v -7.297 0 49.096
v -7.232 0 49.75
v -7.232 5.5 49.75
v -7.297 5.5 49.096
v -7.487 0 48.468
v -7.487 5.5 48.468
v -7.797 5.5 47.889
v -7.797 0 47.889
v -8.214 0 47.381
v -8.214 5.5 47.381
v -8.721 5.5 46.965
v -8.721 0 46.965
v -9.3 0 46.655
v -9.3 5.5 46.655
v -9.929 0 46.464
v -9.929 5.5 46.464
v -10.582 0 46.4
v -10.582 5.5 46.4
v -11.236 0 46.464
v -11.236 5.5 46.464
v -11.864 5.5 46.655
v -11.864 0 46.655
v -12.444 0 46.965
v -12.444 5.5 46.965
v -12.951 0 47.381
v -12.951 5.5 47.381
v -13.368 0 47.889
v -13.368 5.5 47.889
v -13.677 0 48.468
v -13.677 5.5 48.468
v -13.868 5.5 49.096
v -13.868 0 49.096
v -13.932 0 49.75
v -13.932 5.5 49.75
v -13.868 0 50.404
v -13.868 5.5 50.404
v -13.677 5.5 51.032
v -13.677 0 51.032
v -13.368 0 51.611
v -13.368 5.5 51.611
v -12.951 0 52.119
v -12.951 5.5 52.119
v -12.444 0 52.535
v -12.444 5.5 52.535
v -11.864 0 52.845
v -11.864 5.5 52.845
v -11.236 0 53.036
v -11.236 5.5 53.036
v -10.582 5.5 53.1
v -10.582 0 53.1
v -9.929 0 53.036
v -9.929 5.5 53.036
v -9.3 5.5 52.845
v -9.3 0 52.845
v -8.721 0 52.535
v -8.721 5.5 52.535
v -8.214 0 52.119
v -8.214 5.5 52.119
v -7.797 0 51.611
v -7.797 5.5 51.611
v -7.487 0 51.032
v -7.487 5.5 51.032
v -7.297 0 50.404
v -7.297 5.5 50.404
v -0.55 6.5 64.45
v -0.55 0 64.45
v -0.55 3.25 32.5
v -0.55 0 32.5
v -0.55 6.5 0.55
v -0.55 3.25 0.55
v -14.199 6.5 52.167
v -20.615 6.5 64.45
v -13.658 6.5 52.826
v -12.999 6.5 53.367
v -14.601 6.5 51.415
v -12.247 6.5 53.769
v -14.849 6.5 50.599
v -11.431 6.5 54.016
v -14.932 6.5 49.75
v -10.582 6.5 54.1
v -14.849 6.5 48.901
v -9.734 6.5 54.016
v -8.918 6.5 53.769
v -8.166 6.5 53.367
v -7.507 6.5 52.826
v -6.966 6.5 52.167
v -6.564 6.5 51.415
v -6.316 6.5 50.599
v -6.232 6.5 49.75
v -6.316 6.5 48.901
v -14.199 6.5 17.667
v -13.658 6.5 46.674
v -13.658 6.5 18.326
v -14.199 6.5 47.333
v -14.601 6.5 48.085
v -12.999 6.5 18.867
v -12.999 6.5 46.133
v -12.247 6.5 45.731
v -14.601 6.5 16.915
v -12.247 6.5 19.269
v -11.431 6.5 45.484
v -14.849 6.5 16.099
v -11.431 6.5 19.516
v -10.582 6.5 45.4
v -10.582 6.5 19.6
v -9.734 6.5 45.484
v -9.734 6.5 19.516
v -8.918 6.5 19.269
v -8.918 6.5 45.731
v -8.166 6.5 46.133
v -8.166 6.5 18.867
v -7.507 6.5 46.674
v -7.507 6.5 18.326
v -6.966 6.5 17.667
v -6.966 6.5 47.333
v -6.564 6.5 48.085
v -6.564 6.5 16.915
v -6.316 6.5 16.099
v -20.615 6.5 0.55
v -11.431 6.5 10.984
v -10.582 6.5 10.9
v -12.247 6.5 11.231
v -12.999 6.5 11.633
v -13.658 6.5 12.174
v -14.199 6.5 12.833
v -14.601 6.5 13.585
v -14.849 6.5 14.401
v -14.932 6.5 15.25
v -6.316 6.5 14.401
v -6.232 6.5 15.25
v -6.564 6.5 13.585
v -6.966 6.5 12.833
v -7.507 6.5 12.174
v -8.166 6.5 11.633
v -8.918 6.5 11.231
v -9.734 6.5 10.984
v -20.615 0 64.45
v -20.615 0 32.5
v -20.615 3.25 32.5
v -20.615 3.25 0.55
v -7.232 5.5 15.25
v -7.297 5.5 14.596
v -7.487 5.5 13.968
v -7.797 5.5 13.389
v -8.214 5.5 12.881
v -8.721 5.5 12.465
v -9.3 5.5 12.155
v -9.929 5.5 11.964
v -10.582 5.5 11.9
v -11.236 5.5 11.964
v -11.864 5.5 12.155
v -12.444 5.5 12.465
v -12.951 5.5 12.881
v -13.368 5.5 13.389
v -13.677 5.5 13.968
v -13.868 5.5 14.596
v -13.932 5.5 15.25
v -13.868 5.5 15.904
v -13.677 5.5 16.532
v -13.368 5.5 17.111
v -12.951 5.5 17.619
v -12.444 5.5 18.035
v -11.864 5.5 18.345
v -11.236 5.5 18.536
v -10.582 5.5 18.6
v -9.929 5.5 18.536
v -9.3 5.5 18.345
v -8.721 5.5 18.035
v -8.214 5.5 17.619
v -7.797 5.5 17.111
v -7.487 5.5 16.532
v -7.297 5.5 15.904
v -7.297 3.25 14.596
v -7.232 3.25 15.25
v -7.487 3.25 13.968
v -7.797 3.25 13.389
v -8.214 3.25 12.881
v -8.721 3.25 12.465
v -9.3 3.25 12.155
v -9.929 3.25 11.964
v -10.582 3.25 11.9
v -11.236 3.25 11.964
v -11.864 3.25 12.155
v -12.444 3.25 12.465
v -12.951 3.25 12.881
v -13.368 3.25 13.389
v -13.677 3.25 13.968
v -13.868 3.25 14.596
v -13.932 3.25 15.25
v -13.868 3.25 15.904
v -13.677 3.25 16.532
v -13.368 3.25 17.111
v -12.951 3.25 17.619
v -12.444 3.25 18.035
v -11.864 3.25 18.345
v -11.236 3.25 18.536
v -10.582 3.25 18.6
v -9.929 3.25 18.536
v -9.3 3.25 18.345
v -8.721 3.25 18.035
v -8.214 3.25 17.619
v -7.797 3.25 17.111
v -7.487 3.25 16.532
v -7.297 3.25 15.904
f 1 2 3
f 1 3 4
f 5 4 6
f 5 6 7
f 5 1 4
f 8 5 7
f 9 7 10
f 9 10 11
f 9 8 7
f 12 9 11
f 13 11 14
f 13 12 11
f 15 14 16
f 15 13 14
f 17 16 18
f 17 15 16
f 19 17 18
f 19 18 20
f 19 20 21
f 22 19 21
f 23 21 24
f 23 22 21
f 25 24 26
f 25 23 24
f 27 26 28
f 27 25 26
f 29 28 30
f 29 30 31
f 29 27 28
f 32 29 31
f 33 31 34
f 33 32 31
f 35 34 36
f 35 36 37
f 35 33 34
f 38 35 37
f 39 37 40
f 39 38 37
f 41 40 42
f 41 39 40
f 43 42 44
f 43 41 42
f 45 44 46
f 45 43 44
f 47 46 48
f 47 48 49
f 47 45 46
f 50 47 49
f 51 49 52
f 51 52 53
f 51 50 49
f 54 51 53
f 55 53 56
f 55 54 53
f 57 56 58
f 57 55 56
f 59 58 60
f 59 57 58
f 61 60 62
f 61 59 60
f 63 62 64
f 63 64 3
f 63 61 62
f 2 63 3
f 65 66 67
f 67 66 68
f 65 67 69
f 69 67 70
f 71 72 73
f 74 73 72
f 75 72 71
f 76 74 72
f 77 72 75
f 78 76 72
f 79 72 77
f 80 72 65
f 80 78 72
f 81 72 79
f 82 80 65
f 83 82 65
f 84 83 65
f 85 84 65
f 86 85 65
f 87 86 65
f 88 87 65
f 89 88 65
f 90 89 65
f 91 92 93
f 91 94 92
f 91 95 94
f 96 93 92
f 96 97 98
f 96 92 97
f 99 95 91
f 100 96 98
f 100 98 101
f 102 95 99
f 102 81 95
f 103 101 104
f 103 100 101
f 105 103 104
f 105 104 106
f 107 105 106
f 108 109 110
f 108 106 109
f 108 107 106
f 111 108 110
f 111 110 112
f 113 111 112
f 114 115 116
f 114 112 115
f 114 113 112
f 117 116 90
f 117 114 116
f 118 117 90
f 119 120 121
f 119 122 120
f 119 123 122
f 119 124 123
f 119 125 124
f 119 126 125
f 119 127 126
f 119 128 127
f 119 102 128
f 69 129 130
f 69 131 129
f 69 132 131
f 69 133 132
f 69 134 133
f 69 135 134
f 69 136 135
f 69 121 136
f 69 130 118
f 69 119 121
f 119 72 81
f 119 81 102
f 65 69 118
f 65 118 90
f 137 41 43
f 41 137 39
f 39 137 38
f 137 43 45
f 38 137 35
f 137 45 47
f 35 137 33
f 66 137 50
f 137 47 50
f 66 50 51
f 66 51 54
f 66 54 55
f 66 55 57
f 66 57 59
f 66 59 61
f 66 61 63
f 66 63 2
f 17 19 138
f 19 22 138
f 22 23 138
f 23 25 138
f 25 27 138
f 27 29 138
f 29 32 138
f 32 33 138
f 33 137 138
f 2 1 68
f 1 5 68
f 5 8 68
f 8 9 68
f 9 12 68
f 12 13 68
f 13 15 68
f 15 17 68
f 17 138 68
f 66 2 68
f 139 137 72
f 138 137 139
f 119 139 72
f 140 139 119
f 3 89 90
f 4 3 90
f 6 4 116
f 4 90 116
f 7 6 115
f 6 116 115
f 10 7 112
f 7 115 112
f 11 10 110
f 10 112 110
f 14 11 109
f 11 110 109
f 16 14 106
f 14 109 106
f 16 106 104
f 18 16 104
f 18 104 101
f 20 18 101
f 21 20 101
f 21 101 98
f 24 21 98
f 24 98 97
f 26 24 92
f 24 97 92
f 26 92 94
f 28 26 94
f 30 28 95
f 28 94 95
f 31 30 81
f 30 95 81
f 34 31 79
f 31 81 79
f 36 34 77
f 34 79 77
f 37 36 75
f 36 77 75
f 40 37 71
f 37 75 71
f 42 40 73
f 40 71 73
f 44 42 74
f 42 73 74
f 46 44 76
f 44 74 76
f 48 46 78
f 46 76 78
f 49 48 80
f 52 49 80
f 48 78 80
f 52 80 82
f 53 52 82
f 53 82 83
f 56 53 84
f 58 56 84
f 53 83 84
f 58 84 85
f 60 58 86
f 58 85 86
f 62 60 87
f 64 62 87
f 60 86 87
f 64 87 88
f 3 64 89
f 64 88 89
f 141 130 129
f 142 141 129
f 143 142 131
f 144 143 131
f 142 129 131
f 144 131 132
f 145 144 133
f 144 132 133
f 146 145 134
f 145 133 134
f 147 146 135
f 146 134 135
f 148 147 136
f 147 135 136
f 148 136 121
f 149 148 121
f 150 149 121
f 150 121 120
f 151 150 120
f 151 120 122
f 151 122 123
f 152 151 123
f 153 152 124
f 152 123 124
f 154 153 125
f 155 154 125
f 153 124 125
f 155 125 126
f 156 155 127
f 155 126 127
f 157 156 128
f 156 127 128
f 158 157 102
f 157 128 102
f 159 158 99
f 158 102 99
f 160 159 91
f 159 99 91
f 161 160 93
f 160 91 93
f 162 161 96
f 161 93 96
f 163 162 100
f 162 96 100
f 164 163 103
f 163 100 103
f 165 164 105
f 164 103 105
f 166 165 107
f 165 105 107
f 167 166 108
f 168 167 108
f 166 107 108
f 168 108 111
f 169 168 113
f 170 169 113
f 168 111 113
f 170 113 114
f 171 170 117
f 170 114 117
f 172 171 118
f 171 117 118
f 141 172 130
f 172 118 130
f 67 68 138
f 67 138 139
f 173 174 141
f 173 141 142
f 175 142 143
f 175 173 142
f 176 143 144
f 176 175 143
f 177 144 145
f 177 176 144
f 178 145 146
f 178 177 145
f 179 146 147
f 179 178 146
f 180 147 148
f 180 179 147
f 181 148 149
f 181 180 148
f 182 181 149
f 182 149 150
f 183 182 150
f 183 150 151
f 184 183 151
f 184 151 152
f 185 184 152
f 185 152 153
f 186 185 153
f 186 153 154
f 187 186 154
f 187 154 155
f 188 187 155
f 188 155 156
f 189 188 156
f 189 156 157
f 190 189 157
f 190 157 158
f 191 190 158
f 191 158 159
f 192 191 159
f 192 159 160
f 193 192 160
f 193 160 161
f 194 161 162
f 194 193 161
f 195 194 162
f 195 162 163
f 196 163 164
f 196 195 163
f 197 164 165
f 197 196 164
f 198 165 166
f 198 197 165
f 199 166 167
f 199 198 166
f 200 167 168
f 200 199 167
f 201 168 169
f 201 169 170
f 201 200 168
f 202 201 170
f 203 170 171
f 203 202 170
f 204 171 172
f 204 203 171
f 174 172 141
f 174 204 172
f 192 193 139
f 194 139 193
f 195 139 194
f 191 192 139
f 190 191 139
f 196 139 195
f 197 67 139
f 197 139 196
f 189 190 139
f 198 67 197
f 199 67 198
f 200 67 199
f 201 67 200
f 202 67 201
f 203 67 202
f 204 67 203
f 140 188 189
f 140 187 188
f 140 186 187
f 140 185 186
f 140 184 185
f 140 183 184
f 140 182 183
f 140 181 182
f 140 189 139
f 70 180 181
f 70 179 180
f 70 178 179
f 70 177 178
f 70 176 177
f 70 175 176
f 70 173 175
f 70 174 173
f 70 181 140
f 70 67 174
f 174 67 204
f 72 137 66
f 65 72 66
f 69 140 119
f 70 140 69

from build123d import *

# Parameters (mm, degrees)
SKETCH1_W           = 20.06486665
SKETCH1_H           = 63.9
SKETCH1_R           = 3.35
BOSS_EXTRUDE1_DEPTH = 6.5
CHAMFER1_SIZE       = 1
SKETCH2_W           = 31.95
SKETCH2_H           = 3.25
CUT_EXTRUDE1_DEPTH  = 21.06486665


with BuildPart() as part:
    # Sketch1 → Boss-Extrude1 (new body)
    with BuildSketch(Plane(origin=(0, 0, 0), x_dir=(1, 0, 0), z_dir=(0, 1, 0))):
        with Locations((-10.582433325, -32.5)):
            Rectangle(SKETCH1_W, SKETCH1_H)
        with Locations((-10.582433325, -15.25)):
            Circle(SKETCH1_R, mode=Mode.SUBTRACT)
        with Locations((-10.582433325, -49.75)):
            Circle(SKETCH1_R, mode=Mode.SUBTRACT)
    extrude(amount=BOSS_EXTRUDE1_DEPTH)

    # Chamfer1
    chamfer1_edges = [part.edges().sort_by_distance(p)[0] for p in [
        (-13.932433325, 6.5, 15.25),
        (-13.932433325, 6.5, 49.75),
    ]]
    chamfer(chamfer1_edges, length=CHAMFER1_SIZE)

    # Sketch2 → Cut-Extrude1 (cut, through all)
    with BuildSketch(Plane(origin=(-0.55, 0, 0), x_dir=(0, 0, -1), z_dir=(1, 0, 0))):
        with Locations((-16.525, 1.625)):
            Rectangle(SKETCH2_W, SKETCH2_H)
    extrude(amount=-CUT_EXTRUDE1_DEPTH, mode=Mode.SUBTRACT)


solid = part.part
